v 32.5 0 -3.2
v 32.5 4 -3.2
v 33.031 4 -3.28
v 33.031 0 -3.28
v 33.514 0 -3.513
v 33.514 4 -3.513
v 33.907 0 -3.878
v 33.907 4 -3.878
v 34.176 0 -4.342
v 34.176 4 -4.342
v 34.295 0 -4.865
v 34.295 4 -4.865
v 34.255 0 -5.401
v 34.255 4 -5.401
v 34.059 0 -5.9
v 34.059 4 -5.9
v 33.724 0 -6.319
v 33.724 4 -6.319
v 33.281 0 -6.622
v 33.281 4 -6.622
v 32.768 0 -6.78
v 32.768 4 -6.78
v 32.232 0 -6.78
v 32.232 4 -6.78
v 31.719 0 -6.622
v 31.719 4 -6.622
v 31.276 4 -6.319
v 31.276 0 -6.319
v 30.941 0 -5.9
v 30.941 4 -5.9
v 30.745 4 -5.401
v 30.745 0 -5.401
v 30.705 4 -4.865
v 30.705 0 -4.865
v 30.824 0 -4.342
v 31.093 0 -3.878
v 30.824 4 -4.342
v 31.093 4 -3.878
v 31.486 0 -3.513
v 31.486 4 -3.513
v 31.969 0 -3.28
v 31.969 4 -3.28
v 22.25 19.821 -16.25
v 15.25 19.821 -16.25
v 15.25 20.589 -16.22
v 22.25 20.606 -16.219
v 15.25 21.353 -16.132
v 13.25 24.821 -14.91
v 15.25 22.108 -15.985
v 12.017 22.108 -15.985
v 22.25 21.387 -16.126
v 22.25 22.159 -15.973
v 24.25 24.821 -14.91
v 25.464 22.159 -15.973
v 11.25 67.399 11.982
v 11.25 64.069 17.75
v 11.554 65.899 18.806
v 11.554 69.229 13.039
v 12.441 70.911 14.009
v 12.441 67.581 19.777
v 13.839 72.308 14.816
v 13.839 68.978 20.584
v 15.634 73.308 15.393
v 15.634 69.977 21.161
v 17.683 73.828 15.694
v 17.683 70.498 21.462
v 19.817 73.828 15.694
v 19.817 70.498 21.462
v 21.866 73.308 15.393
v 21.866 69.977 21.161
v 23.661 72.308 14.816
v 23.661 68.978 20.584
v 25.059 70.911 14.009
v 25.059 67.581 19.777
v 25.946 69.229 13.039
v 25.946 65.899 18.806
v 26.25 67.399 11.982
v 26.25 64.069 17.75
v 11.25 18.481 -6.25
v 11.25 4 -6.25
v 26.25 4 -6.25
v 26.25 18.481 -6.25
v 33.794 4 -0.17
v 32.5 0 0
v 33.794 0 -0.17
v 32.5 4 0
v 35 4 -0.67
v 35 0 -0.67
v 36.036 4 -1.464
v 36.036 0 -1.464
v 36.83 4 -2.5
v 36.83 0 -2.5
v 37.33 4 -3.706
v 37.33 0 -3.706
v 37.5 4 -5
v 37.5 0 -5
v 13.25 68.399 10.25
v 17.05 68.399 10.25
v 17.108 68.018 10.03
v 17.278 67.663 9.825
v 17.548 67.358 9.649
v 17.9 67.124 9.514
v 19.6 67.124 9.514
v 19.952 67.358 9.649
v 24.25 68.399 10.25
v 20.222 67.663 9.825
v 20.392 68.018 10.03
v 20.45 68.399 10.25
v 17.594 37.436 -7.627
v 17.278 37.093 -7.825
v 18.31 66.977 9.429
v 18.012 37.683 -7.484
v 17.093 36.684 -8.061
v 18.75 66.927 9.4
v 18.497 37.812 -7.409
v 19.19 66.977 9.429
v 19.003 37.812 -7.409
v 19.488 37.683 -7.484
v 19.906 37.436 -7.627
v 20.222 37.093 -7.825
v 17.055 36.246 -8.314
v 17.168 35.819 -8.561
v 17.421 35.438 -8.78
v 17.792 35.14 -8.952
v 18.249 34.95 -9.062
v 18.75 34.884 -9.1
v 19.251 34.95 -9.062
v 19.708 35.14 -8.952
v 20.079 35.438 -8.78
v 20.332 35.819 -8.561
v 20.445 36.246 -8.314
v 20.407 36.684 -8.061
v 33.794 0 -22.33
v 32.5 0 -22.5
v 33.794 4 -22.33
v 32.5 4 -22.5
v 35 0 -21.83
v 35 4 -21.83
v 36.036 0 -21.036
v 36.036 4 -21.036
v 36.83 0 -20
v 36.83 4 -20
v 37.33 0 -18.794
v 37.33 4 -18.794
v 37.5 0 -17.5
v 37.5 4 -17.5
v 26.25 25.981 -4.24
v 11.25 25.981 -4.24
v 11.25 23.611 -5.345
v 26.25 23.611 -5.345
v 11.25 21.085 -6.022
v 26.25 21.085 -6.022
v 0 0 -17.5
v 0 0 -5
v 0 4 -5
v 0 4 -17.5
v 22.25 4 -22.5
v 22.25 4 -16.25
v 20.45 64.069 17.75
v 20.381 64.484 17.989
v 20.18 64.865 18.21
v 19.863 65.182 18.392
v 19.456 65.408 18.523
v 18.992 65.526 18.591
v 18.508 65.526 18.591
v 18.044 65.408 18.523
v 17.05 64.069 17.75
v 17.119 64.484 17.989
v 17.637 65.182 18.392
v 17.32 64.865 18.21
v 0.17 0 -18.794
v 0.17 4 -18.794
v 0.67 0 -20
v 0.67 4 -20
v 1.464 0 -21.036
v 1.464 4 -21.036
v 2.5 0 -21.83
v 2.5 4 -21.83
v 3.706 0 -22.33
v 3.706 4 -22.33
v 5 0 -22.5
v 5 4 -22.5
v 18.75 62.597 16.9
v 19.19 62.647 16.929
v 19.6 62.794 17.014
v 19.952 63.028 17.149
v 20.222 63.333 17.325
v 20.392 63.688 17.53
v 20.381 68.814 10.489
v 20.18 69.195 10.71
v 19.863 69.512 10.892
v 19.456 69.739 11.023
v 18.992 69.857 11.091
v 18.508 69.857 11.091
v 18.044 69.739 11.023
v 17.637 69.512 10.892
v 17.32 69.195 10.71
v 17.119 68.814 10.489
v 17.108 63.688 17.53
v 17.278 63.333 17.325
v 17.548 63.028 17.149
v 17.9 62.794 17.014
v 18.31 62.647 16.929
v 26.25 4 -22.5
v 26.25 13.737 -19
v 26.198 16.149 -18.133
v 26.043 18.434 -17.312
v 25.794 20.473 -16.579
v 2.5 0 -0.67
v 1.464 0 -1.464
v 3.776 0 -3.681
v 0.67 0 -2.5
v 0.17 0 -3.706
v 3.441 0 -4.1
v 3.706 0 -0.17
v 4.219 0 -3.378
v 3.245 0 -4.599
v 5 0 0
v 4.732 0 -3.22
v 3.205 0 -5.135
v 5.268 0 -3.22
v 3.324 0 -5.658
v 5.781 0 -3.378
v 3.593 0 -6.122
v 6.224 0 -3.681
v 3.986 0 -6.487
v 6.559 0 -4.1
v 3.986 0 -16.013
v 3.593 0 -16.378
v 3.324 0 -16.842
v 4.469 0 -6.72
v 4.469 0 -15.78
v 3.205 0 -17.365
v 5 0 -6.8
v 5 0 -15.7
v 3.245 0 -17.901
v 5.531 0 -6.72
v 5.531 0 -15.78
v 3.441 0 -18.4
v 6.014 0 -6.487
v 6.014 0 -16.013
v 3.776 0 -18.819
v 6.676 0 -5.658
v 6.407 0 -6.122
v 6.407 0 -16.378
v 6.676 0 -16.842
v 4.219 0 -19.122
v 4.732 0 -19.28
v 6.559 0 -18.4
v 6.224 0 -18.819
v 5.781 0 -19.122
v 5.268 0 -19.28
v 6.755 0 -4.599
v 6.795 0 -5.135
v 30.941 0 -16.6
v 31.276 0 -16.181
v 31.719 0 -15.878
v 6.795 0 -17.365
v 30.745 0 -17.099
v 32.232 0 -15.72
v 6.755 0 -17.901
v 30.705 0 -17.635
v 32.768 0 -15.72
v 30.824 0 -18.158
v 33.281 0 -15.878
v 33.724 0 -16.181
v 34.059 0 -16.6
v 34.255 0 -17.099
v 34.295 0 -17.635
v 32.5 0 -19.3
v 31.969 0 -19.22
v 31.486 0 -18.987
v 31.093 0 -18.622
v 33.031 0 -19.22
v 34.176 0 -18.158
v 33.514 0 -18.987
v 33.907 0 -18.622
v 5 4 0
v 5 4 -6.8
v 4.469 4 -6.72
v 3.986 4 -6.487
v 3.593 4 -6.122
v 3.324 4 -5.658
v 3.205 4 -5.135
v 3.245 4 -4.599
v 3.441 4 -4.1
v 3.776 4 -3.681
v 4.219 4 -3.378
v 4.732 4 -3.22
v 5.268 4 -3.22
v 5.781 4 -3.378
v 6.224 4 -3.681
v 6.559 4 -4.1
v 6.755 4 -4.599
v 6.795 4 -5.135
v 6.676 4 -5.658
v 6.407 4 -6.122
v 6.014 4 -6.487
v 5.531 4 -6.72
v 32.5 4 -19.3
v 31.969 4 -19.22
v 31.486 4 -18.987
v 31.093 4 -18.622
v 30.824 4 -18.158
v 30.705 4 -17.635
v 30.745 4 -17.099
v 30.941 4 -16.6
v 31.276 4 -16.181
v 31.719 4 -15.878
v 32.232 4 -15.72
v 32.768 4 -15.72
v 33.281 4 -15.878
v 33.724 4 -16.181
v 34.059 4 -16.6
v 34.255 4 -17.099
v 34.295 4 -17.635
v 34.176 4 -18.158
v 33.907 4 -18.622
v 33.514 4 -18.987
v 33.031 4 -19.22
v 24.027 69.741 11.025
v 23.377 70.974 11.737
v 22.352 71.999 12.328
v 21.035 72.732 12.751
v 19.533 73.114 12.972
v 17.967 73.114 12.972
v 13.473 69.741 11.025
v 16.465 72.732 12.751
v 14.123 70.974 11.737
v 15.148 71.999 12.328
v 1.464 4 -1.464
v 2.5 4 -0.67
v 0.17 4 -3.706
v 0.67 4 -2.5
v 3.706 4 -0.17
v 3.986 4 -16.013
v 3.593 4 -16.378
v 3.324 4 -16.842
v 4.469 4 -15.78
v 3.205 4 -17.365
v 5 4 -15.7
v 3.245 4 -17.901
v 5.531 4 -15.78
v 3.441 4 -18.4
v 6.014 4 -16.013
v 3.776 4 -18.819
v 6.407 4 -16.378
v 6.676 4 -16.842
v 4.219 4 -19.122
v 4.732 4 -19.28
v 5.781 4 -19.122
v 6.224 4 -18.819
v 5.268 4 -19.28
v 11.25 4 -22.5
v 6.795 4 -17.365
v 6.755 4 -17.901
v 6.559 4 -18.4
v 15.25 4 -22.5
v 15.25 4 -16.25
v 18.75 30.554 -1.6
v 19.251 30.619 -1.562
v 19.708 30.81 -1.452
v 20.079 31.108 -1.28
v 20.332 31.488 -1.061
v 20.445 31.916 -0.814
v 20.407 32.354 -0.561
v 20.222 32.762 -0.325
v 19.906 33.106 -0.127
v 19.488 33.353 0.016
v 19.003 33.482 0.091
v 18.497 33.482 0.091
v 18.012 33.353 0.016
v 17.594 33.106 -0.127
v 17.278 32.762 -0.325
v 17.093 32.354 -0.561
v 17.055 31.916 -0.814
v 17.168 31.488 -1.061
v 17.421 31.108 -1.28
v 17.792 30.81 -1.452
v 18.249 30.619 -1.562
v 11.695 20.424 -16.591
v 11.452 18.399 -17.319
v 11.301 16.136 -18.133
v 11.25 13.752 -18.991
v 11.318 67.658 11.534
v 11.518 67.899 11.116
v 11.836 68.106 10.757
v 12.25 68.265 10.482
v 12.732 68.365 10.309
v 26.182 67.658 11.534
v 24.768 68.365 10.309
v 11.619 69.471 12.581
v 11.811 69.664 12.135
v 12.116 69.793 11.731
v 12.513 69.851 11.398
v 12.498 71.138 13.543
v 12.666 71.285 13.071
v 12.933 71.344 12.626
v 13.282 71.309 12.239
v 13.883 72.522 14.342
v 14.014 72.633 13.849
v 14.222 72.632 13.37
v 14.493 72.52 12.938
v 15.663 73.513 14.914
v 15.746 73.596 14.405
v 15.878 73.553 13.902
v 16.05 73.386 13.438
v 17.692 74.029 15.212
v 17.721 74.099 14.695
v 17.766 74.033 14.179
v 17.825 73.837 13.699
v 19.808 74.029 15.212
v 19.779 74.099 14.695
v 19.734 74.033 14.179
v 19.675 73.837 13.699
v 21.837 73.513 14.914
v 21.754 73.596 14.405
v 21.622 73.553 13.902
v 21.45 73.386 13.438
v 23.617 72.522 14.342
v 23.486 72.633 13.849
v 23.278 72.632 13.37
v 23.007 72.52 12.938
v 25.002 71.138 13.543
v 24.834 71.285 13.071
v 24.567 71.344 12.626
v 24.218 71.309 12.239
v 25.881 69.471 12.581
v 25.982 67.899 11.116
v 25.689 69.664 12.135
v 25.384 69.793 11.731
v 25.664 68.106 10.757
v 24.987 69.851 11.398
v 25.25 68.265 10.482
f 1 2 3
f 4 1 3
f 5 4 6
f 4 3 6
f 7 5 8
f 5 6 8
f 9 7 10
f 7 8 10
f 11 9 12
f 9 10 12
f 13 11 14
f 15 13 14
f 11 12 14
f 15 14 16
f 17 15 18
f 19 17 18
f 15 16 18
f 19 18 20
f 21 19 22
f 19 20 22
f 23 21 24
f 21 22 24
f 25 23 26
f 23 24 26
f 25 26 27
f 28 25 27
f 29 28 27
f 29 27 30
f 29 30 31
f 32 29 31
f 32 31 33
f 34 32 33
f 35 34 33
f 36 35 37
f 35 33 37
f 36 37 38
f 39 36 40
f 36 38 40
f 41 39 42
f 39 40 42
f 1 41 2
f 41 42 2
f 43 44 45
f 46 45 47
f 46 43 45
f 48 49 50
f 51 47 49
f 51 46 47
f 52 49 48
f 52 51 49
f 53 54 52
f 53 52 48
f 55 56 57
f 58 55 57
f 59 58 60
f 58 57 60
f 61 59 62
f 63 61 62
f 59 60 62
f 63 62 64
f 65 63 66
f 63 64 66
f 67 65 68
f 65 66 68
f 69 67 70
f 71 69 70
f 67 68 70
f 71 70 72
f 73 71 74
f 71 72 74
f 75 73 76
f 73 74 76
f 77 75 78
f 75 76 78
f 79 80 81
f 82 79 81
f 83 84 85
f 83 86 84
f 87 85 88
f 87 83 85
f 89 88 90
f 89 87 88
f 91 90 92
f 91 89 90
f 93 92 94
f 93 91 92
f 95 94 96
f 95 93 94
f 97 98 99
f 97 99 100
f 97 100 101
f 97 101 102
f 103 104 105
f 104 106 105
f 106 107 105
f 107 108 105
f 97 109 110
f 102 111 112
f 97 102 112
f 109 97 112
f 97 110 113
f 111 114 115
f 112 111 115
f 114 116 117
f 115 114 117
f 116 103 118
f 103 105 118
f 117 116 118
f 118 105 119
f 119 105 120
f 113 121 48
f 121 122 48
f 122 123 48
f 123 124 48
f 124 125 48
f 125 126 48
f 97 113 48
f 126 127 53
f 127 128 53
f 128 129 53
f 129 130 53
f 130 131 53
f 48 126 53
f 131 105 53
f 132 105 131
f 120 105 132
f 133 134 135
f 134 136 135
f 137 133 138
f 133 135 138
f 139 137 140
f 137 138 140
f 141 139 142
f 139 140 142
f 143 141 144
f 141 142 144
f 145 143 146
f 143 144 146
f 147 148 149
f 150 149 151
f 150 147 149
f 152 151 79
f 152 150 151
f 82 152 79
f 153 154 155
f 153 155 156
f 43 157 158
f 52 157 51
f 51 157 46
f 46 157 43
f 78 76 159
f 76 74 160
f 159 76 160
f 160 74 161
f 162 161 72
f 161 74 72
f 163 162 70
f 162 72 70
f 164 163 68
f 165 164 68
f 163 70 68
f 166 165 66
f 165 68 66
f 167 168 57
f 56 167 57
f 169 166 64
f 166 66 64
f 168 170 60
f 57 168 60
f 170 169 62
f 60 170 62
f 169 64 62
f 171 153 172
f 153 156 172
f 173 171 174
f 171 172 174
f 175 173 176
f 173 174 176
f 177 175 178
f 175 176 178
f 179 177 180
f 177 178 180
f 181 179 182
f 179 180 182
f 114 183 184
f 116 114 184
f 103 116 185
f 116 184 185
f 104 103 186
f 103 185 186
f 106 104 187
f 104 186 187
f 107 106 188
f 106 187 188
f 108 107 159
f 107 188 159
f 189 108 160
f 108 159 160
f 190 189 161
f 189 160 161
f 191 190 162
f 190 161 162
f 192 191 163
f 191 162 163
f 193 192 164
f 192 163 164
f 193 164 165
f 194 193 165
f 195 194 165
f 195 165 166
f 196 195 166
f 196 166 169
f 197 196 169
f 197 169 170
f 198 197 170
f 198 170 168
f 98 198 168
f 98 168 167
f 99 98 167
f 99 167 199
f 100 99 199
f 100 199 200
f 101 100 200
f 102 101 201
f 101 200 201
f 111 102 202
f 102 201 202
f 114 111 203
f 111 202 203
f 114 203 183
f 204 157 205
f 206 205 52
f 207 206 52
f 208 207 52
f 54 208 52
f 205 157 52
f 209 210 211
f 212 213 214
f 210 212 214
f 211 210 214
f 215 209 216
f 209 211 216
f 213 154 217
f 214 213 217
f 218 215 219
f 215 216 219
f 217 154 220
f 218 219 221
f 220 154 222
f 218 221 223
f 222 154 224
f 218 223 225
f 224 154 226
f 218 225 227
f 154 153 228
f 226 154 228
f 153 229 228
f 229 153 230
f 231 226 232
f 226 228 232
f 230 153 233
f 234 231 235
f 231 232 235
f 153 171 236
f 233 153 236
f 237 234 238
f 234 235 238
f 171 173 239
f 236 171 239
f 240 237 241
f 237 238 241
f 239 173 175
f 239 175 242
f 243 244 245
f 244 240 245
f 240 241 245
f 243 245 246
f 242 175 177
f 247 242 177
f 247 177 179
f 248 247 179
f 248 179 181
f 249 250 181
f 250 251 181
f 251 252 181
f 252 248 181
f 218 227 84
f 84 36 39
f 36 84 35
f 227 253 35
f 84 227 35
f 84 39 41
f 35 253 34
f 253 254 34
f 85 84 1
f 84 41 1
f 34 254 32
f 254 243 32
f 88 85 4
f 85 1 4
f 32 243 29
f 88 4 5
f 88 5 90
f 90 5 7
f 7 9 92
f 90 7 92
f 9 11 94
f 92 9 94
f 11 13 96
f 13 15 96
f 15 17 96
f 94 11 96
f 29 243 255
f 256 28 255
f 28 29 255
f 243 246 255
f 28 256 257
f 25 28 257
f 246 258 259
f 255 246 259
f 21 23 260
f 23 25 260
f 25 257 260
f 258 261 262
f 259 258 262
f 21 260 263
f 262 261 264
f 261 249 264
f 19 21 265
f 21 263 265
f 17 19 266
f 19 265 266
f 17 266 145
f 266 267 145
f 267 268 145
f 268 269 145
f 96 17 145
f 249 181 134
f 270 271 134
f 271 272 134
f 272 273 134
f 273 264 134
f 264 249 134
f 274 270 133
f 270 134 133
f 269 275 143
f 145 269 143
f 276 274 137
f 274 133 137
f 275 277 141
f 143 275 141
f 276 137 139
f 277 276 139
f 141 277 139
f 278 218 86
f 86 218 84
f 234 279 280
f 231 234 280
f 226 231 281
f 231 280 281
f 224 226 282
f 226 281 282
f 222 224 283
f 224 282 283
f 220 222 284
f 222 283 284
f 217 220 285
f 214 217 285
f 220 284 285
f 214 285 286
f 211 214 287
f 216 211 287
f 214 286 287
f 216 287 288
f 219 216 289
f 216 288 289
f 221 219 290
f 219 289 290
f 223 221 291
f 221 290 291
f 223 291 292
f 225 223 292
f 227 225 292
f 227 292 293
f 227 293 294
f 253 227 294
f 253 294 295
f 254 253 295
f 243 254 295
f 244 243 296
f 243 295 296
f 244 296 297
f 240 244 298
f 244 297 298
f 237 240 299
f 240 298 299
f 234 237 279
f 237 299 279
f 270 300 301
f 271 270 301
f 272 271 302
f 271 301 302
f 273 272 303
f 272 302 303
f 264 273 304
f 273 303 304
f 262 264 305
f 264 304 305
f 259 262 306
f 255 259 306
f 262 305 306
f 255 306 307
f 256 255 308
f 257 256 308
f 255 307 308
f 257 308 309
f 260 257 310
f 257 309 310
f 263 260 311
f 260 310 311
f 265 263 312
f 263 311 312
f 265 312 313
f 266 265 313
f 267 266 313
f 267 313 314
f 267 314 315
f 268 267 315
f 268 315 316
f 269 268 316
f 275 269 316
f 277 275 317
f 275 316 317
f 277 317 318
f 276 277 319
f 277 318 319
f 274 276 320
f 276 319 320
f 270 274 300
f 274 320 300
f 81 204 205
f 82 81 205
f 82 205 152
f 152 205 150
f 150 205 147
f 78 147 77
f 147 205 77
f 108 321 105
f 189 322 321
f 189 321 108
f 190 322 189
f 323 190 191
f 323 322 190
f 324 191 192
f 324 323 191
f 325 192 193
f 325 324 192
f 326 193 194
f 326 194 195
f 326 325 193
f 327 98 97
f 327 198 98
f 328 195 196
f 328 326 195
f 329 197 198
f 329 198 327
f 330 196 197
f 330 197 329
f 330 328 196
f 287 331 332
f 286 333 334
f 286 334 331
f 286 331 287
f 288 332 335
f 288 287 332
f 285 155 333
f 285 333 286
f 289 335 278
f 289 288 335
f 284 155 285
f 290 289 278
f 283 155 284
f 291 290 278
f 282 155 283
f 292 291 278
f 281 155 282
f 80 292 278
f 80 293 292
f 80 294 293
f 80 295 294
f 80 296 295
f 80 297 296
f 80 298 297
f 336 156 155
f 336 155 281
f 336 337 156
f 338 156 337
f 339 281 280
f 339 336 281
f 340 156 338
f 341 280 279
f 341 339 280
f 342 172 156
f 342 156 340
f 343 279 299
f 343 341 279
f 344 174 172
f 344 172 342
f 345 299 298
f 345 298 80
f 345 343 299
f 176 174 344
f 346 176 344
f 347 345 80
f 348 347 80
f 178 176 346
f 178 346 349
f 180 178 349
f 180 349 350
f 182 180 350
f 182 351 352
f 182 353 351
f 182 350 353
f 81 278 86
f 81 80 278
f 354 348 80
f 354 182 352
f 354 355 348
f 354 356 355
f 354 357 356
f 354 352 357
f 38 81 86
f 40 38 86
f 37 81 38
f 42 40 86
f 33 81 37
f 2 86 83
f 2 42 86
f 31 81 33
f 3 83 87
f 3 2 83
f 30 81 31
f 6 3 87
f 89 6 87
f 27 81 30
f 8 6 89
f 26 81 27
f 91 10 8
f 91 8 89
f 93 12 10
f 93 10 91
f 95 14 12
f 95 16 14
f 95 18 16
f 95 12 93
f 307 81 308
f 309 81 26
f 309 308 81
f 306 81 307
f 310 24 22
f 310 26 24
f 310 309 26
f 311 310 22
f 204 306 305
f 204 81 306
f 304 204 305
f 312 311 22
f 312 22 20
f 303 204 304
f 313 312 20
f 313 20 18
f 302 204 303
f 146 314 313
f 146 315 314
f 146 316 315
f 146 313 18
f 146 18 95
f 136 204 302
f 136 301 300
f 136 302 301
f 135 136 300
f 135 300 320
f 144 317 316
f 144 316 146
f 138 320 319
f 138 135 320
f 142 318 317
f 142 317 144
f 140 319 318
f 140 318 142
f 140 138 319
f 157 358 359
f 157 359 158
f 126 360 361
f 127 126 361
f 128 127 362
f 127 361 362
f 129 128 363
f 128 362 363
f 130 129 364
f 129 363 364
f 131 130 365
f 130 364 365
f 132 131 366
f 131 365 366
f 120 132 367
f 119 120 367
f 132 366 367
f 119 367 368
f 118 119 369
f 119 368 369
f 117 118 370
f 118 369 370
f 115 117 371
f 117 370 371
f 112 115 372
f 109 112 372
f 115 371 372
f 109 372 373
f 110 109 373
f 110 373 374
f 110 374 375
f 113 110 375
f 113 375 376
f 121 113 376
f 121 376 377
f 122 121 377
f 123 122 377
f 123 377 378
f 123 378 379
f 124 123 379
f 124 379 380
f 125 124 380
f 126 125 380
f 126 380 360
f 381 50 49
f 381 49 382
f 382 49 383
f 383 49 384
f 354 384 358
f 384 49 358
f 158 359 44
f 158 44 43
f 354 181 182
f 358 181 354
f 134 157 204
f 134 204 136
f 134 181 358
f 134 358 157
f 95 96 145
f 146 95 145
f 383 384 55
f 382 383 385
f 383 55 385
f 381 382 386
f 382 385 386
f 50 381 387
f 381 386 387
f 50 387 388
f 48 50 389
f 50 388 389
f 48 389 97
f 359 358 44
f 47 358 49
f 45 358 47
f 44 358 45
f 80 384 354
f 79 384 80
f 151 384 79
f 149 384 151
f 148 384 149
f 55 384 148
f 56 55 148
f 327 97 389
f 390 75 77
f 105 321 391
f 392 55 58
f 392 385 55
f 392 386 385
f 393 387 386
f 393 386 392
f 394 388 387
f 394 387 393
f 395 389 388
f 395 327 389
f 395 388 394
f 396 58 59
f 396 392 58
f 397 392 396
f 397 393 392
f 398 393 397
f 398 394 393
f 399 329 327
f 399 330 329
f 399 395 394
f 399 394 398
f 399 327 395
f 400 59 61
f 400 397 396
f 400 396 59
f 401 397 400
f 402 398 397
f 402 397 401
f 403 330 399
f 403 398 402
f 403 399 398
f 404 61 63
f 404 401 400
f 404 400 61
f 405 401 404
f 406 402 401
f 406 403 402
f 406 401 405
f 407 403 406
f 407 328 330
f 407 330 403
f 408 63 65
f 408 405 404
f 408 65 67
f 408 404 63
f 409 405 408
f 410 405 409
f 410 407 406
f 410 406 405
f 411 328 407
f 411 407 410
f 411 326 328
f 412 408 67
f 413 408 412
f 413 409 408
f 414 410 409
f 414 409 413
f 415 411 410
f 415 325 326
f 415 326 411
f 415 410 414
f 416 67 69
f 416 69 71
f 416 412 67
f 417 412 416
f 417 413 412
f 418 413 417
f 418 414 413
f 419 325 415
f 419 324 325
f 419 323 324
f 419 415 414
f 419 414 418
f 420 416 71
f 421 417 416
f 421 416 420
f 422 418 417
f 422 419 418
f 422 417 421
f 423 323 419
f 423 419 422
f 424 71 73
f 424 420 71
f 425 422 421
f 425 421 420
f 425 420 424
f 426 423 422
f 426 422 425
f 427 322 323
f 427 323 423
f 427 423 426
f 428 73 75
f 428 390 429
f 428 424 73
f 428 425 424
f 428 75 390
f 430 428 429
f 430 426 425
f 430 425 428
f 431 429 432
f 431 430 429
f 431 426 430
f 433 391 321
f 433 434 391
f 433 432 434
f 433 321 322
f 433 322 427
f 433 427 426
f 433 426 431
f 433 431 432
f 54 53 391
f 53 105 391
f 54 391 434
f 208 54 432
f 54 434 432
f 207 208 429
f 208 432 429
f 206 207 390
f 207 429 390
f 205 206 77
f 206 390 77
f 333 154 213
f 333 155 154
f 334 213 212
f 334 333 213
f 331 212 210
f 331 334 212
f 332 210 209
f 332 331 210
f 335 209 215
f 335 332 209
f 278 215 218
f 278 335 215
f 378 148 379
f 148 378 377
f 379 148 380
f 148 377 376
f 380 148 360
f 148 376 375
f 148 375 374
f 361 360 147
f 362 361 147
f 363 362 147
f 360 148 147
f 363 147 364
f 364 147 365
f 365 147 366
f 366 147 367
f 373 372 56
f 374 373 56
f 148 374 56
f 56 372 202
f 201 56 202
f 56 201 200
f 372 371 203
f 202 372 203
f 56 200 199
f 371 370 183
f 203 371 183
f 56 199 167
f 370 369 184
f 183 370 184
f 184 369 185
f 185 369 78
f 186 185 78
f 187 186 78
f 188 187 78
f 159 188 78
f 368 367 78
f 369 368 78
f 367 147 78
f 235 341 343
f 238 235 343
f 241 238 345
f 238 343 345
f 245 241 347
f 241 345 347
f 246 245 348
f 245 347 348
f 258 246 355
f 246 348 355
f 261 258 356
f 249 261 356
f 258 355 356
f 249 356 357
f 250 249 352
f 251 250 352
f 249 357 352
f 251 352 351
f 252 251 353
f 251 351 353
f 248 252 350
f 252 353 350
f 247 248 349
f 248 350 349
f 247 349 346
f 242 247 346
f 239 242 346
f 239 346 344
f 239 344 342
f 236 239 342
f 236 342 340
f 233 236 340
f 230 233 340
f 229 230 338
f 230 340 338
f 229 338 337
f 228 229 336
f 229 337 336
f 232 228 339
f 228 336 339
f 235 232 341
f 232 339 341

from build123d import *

# Parameters (mm, degrees)
SKETCH_1_W          = 37.5
SKETCH_1_H          = 22.5
EXTRUDE_2_DEPTH     = 4
SKETCH_2_W          = 15
SKETCH_2_H          = 10
EXTRUDE_3_DEPTH     = 18.5
EXTRUDE_4_DEPTH     = 15
EXTRUDE_5_DEPTH     = 8.66025404
SKETCH_5_R          = 1.7
CUT_EXTRUDE_1_DEPTH = 10
FILLET_1_R          = 15
FILLET_3_R          = 5
SKETCH_9_R          = 1.8
CUT_EXTRUDE_2_DEPTH = 4
FILLET_5_R          = 10
RIB_10_REACH        = 84.489
SKETCH_16_WALL_W    = 186.275176358
SKETCH_16_WALL_H    = 4
RIB_START           = -4
RIB_11_DEPTH        = 4
FILLET_6_R          = 2


# Read off the part's stored shape, not the designer's step: 筋11
with BuildPart() as part:
    # 草图1 → 凸台-拉伸2 (new body)
    with BuildSketch(Plane(origin=(0, 0, 0), x_dir=(1, 0, 0), z_dir=(0, 1, 0))):
        with Locations((18.75, 11.25)):
            Rectangle(SKETCH_1_W, SKETCH_1_H)
    extrude(amount=EXTRUDE_2_DEPTH)

    # 草图2 → 凸台-拉伸3 (add)
    with BuildSketch(Plane(origin=(0, 4, 0), x_dir=(1, 0, 0), z_dir=(0, 1, 0))):
        with Locations((18.75, 11.25)):
            Rectangle(SKETCH_2_W, SKETCH_2_H)
    extrude(amount=EXTRUDE_3_DEPTH)

    # 草图3 → 凸台-拉伸4 (add)
    with BuildSketch(Plane(origin=(26.25, 0, 0), x_dir=(0, 0, -1), z_dir=(1, 0, 0))):
        Polygon((6.25, 22.5), (-17.75, 64.069219382), (-10.25, 68.399346401), (16.25, 22.5), align=None)
    extrude(amount=-EXTRUDE_4_DEPTH)

    # 草图4 → 凸台-拉伸5 (add)
    with BuildSketch(Plane(origin=(0, 8.331329387, -14.430285793), x_dir=(1, 0, 0), z_dir=(0, -0.5000000000000041, 0.8660254037844363))):
        with BuildLine():
            Line((26.25, 64.360571585), (11.25, 64.360571585))
            ThreePointArc((11.25, 64.360571585), (18.75, 71.860571585), (26.25, 64.360571585))
        make_face()
    extrude(amount=-EXTRUDE_5_DEPTH)

    # 草图5 → 切除-拉伸1 (cut)
    with BuildSketch(Plane(origin=(0, 8.331329387, -14.430285793), x_dir=(1, 0, 0), z_dir=(0, -0.5000000000000041, 0.8660254037844363))):
        with Locations(Location((18.75, 64.360571585, 0), (0, 0, 270))):
            Circle(SKETCH_5_R)
        with Locations(Location((18.75, 27.360571585, 0), (0, 0, 270))):
            Circle(SKETCH_5_R)
    extrude(amount=-CUT_EXTRUDE_1_DEPTH, mode=Mode.SUBTRACT)

    # 圆角1
    fillet_1_edges = [part.edges().sort_by_distance(p)[0] for p in [
        (18.75, 22.5, -6.25),
    ]]
    fillet(fillet_1_edges, radius=FILLET_1_R)

    # 圆角3
    fillet_3_edges = [part.edges().sort_by_distance(p)[0] for p in [
        (0, 2, -22.5),
        (37.5, 2, -22.5),
        (37.5, 2, 0),
        (0, 2, 0),
    ]]
    fillet(fillet_3_edges, radius=FILLET_3_R)

    # 草图9 → 切除-拉伸2 (cut)
    with BuildSketch(Plane(origin=(0, 4, 0), x_dir=(1, 0, 0), z_dir=(0, 1, 0))):
        with Locations(Location((5, 17.5, 0), (0, 0, 270))):
            Circle(SKETCH_9_R)
        with Locations(Location((32.5, 17.5, 0), (0, 0, 90))):
            Circle(SKETCH_9_R)
        with Locations(Location((32.5, 5, 0), (0, 0, 270))):
            Circle(SKETCH_9_R)
        with Locations(Location((5, 5, 0), (0, 0, 90))):
            Circle(SKETCH_9_R)
    extrude(amount=-CUT_EXTRUDE_2_DEPTH, mode=Mode.SUBTRACT)

    # 圆角5
    fillet_5_edges = [part.edges().sort_by_distance(p)[0] for p in [
        (18.75, 22.5, -16.25),
    ]]
    fillet(fillet_5_edges, radius=FILLET_5_R)

    # 草图16 wall → 筋10 (add, up to next)
    with BuildSketch(Plane(origin=(26.25, 13.079426042, -19.236382193), x_dir=(0, 0.941051653324, 0.33826289447), z_dir=(0, -0.33826289447, 0.941051653324)), mode=Mode.PRIVATE) as rib_10_sk1:
        with Locations((0, 2)):
            Rectangle(SKETCH_16_WALL_W, SKETCH_16_WALL_H)
    rib_10_tool1 = extrude(rib_10_sk1.sketch, amount=RIB_10_REACH, mode=Mode.PRIVATE) - part.part
    add(rib_10_tool1.solids().sort_by_distance((26.25, 13.079426042, -19.236382193))[0])

    # 筋11 outline → 筋11 (add)
    with BuildSketch(Plane.ZY.offset(-11.25).offset(RIB_START)):
        with BuildLine():
            Line((-15.98478303, 22.108301633), (-22.5, 4))
            Line((-22.5, 4), (-16.25, 4))
            Line((-16.25, 4), (-16.25, 19.820508076))
            ThreePointArc((-16.25, 19.820508076), (-16.183474475, 20.972065652), (-15.98478303, 22.108301633))
        make_face()
    extrude(amount=RIB_11_DEPTH)

    # 圆角6
    # the kernel refuses this fillet: 2 mm, written as the material it takes off along each edge
    with BuildSketch(Plane(origin=(11.25, 68.399346401, 10.25), x_dir=(1.7763568394002473e-15, -0.5000000000000042, 0.8660254037844363), z_dir=(0, -0.8660254037844363, -0.5000000000000042)), Plane(origin=(26.25, 68.399346401, 10.25), x_dir=(-1, 0, 0), z_dir=(0, -0.8660254037844363, -0.5000000000000042))) as fillet_6_piece_1:
        with BuildLine():
            CenterArc((FILLET_6_R, -FILLET_6_R), FILLET_6_R, 90, 90)
            Line((0, -FILLET_6_R), (-FILLET_6_R * 0.02, -FILLET_6_R))
            Line((-FILLET_6_R * 0.02, -FILLET_6_R), (-FILLET_6_R * 0.02, FILLET_6_R * 0.02))
            Line((-FILLET_6_R * 0.02, FILLET_6_R * 0.02), (FILLET_6_R, FILLET_6_R * 0.02))
            Line((FILLET_6_R, FILLET_6_R * 0.02), (FILLET_6_R, 0))
        make_face()
    extrude(amount=62.320508076, mode=Mode.SUBTRACT)
    with BuildSketch(Plane(origin=(18.75, 68.399346402, 10.249999998), x_dir=(-1, 0, 0), z_dir=(0, -0.8660254037844363, -0.5000000000000041))) as fillet_6_piece_2:
        with BuildLine():
            CenterArc((7.5 - FILLET_6_R, -FILLET_6_R * 1.00000000108), FILLET_6_R, 360, 90)
            Line((7.5, -FILLET_6_R * 1.00000000108), (7.5 + FILLET_6_R * 0.02, -FILLET_6_R * 1.00000000108))
            Line((7.5 + FILLET_6_R * 0.02, -FILLET_6_R * 1.00000000108), (7.5 + FILLET_6_R * 0.02, FILLET_6_R * 0.02))
            Line((7.5 + FILLET_6_R * 0.02, FILLET_6_R * 0.02), (7.5 - FILLET_6_R, FILLET_6_R * 0.0199999989222))
            Line((7.5 - FILLET_6_R, FILLET_6_R * 0.0199999989222), (7.5 - FILLET_6_R, -FILLET_6_R * 1.07782831552e-09))
        make_face()
    revolve(axis=Axis((18.75, 68.399346402, 10.249999998), (0, 0.5000000000000041, -0.8660254037844363)), revolution_arc=180, mode=Mode.SUBTRACT)


solid = part.part
